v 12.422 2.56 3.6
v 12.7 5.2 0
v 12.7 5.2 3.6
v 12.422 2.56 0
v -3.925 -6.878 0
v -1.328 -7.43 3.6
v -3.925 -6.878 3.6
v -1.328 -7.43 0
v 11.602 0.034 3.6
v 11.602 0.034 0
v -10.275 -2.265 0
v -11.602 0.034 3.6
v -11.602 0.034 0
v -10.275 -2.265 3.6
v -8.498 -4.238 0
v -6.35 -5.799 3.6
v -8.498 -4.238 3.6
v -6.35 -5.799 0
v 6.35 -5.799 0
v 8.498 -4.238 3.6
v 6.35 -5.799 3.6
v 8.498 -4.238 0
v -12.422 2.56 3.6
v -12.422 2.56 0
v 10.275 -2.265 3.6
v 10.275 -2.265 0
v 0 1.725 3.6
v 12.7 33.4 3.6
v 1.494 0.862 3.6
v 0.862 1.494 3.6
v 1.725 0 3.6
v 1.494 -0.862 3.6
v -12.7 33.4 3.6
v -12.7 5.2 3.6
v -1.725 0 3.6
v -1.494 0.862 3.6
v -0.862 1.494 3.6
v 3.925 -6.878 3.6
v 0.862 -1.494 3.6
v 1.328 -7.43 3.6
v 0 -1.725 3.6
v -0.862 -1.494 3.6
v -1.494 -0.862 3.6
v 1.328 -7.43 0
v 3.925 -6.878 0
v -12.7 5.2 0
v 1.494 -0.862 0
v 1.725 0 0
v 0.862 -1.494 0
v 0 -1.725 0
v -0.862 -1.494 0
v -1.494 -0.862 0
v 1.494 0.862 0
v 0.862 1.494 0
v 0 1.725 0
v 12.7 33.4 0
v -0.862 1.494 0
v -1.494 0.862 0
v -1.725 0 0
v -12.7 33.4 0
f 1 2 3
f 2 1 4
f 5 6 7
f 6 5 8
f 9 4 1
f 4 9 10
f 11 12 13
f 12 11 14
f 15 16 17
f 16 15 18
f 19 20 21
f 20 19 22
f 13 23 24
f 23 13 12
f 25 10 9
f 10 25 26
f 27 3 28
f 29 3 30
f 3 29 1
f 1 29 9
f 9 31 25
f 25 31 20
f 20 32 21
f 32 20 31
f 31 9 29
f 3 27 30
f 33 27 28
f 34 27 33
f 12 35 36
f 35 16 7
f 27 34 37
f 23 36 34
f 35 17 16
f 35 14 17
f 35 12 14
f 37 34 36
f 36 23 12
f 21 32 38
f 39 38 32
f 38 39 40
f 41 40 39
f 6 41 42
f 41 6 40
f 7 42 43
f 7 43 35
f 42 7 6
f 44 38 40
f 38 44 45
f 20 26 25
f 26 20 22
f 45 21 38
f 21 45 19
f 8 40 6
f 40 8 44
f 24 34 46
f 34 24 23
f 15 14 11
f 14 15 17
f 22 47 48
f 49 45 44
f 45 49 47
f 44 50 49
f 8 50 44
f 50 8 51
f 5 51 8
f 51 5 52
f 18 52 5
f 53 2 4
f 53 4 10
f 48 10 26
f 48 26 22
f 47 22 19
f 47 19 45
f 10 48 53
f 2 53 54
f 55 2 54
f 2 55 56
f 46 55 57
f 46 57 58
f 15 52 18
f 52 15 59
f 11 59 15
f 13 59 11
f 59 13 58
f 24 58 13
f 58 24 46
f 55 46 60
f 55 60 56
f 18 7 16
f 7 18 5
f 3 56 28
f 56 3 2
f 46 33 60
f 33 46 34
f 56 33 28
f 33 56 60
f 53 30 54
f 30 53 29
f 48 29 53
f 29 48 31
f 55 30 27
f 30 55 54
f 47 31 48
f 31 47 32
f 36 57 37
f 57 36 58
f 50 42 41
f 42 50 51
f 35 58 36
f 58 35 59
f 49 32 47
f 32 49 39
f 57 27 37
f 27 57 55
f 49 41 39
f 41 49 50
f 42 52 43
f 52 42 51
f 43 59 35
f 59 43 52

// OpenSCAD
// file: configuration.scad
// Increase this if your slicer or printer make holes too tight.
extra_radius = 0.1;

// OD = outside diameter, corner to corner.
m3_nut_od = 6.1;
m3_nut_radius = m3_nut_od/2 + 0.2 + extra_radius;
m3_washer_radius = 3.5 + extra_radius;

// Major diameter of metric 3mm thread.
m3_major = 2.85;
m3_radius = m3_major/2 + extra_radius;
m3_wide_radius = m3_major/2 + extra_radius + 0.2;

// NEMA17 stepper motors.
motor_shaft_diameter = 5;
motor_shaft_radius = motor_shaft_diameter/2 + extra_radius;

// Frame brackets. M3x8mm screws work best with 3.6 mm brackets.
thickness = 3.6;

// OpenBeam or Misumi. Currently only 15x15 mm, but there is a plan
// to make models more parametric and allow 20x20 mm in the future.
extrusion = 15;

// Placement for the NEMA17 stepper motors.
motor_offset = 44;
motor_length = 47;
// main file
include <configuration.scad>;

sticky_width = 25.4;
sticky_length = 25.4;
sticky_offset = 8;  // Distance from screw center to glass edge.

// Make the round edge line up with the outside of OpenBeam.
screw_offset = sticky_width/2 - 7.5;
cube_length = sticky_length + sticky_offset - screw_offset;

module glass_tab() {
  difference() {
    translate([0, screw_offset, 0]) union() {
      cylinder(r=sticky_width/2, h=thickness, center=true);
      translate([0, cube_length/2, 0])
        cube([sticky_width, cube_length, thickness], center=true);
    }
    cylinder(r=m3_wide_radius, h=20, center=true, $fn=12);
  }
  // Scotch restickable tab for mounting.
  translate([0, sticky_length/2+sticky_offset, thickness/2]) %
    cube([sticky_width, sticky_length, 0.7], center=true);
  // Horizontal OpenBeam.
  translate([0, 0, (15+thickness)/-2]) %
    cube([100, 15, 15], center=true);
}

translate([0, 0, thickness/2]) glass_tab();
